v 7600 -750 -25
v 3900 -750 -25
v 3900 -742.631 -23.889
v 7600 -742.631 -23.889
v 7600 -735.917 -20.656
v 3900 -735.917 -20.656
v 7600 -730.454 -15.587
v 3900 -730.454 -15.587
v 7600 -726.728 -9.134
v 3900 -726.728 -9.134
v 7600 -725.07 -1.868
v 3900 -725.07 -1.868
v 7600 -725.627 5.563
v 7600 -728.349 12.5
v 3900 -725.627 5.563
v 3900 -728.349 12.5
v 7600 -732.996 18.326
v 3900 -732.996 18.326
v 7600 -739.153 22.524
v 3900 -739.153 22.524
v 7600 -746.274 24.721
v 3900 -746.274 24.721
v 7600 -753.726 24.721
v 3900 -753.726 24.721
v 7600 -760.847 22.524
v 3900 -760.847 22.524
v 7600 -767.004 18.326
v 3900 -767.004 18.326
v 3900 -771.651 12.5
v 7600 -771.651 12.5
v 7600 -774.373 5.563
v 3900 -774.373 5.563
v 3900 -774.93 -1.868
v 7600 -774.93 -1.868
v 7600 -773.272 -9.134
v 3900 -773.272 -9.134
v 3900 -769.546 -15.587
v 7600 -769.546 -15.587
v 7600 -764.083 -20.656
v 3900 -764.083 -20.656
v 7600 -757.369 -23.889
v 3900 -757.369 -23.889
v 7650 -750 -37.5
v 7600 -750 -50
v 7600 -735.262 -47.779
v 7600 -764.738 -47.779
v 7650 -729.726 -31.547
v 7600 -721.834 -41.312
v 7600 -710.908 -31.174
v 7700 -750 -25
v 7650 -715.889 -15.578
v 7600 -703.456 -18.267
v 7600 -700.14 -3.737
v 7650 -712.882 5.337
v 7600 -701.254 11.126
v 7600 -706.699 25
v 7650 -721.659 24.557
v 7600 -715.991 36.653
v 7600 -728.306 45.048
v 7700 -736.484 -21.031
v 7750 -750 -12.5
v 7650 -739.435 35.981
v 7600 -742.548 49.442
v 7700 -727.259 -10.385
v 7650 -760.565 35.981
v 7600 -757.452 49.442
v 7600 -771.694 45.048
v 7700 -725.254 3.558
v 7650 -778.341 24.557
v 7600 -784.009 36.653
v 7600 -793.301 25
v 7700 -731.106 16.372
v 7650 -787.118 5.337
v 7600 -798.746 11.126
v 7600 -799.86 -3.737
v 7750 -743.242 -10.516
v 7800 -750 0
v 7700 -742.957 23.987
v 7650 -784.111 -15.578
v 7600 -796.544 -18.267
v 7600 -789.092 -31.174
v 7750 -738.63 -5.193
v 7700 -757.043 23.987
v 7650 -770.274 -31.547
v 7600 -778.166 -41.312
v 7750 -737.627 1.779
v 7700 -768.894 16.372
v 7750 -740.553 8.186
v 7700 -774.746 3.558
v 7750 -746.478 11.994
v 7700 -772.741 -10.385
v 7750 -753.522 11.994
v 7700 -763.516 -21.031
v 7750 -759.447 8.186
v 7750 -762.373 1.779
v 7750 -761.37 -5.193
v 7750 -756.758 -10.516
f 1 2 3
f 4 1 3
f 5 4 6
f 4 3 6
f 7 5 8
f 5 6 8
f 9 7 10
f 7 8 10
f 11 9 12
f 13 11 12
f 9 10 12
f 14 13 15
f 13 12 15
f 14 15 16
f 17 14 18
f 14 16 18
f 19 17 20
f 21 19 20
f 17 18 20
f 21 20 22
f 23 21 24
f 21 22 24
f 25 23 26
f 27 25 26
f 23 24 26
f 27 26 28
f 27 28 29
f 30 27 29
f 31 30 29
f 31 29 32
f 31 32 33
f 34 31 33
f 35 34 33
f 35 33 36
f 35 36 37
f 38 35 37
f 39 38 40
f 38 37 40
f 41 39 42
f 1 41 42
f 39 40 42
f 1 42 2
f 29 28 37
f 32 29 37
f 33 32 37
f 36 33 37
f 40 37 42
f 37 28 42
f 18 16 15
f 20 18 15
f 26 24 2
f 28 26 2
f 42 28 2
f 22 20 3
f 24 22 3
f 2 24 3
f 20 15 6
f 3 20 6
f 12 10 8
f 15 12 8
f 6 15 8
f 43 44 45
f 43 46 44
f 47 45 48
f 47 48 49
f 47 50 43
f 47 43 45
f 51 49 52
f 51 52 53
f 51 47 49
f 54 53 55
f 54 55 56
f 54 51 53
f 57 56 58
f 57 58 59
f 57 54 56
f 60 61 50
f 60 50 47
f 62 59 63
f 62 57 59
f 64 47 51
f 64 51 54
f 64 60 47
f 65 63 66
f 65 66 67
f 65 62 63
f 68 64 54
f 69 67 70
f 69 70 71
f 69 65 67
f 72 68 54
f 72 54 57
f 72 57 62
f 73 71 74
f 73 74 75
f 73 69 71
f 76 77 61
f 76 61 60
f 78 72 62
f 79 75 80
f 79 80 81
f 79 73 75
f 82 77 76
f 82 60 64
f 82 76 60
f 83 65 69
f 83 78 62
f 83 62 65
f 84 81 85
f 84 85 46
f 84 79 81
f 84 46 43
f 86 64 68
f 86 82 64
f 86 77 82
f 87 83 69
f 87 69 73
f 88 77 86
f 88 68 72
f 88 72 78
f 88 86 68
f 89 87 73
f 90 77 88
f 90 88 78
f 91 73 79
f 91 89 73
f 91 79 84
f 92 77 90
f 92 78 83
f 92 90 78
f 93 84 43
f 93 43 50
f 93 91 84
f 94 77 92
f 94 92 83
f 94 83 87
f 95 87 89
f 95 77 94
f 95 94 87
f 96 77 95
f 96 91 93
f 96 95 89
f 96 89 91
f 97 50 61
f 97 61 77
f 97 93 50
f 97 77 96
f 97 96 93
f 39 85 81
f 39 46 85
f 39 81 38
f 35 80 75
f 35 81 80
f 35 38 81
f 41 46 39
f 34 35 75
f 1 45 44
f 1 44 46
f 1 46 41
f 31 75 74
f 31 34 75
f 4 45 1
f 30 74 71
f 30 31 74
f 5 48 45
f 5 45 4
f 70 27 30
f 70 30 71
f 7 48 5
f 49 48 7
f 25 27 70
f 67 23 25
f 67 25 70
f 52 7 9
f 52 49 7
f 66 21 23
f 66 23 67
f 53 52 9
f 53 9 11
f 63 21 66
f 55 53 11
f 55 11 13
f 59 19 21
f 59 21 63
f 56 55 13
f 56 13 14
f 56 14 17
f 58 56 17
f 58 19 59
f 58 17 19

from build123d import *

# Parameters (mm, degrees)
CYLINDER003_R     = 25
CYLINDER003_DEPTH = 3700


with BuildPart() as cone004:
    # Cone004 → Cone004 (revolve)
    with BuildSketch(Plane(origin=(3700, 0, 0), x_dir=(0, 0, -1), z_dir=(0, -1, 0))):
        Polygon((0, 0), (50, 0), (0, 200), align=None)
    revolve(axis=Axis((3700, 0, 0), (1, 0, 0)))


with BuildPart() as fusion015:
    # Cylinder003 → Cylinder003 (new body)
    with BuildSketch(Plane(origin=(0, 0, 0), x_dir=(0, 0, -1), z_dir=(1, 0, 0))):
        Circle(CYLINDER003_R)
    extrude(amount=CYLINDER003_DEPTH)

    # Fusion015: union Cone004
    add(cone004.part)


with BuildPart() as fusion015_1:
    # Fusion015 placement: moved
    add(fusion015.part.moved(Location((3900, -750, 0))))


solid = fusion015_1.part
